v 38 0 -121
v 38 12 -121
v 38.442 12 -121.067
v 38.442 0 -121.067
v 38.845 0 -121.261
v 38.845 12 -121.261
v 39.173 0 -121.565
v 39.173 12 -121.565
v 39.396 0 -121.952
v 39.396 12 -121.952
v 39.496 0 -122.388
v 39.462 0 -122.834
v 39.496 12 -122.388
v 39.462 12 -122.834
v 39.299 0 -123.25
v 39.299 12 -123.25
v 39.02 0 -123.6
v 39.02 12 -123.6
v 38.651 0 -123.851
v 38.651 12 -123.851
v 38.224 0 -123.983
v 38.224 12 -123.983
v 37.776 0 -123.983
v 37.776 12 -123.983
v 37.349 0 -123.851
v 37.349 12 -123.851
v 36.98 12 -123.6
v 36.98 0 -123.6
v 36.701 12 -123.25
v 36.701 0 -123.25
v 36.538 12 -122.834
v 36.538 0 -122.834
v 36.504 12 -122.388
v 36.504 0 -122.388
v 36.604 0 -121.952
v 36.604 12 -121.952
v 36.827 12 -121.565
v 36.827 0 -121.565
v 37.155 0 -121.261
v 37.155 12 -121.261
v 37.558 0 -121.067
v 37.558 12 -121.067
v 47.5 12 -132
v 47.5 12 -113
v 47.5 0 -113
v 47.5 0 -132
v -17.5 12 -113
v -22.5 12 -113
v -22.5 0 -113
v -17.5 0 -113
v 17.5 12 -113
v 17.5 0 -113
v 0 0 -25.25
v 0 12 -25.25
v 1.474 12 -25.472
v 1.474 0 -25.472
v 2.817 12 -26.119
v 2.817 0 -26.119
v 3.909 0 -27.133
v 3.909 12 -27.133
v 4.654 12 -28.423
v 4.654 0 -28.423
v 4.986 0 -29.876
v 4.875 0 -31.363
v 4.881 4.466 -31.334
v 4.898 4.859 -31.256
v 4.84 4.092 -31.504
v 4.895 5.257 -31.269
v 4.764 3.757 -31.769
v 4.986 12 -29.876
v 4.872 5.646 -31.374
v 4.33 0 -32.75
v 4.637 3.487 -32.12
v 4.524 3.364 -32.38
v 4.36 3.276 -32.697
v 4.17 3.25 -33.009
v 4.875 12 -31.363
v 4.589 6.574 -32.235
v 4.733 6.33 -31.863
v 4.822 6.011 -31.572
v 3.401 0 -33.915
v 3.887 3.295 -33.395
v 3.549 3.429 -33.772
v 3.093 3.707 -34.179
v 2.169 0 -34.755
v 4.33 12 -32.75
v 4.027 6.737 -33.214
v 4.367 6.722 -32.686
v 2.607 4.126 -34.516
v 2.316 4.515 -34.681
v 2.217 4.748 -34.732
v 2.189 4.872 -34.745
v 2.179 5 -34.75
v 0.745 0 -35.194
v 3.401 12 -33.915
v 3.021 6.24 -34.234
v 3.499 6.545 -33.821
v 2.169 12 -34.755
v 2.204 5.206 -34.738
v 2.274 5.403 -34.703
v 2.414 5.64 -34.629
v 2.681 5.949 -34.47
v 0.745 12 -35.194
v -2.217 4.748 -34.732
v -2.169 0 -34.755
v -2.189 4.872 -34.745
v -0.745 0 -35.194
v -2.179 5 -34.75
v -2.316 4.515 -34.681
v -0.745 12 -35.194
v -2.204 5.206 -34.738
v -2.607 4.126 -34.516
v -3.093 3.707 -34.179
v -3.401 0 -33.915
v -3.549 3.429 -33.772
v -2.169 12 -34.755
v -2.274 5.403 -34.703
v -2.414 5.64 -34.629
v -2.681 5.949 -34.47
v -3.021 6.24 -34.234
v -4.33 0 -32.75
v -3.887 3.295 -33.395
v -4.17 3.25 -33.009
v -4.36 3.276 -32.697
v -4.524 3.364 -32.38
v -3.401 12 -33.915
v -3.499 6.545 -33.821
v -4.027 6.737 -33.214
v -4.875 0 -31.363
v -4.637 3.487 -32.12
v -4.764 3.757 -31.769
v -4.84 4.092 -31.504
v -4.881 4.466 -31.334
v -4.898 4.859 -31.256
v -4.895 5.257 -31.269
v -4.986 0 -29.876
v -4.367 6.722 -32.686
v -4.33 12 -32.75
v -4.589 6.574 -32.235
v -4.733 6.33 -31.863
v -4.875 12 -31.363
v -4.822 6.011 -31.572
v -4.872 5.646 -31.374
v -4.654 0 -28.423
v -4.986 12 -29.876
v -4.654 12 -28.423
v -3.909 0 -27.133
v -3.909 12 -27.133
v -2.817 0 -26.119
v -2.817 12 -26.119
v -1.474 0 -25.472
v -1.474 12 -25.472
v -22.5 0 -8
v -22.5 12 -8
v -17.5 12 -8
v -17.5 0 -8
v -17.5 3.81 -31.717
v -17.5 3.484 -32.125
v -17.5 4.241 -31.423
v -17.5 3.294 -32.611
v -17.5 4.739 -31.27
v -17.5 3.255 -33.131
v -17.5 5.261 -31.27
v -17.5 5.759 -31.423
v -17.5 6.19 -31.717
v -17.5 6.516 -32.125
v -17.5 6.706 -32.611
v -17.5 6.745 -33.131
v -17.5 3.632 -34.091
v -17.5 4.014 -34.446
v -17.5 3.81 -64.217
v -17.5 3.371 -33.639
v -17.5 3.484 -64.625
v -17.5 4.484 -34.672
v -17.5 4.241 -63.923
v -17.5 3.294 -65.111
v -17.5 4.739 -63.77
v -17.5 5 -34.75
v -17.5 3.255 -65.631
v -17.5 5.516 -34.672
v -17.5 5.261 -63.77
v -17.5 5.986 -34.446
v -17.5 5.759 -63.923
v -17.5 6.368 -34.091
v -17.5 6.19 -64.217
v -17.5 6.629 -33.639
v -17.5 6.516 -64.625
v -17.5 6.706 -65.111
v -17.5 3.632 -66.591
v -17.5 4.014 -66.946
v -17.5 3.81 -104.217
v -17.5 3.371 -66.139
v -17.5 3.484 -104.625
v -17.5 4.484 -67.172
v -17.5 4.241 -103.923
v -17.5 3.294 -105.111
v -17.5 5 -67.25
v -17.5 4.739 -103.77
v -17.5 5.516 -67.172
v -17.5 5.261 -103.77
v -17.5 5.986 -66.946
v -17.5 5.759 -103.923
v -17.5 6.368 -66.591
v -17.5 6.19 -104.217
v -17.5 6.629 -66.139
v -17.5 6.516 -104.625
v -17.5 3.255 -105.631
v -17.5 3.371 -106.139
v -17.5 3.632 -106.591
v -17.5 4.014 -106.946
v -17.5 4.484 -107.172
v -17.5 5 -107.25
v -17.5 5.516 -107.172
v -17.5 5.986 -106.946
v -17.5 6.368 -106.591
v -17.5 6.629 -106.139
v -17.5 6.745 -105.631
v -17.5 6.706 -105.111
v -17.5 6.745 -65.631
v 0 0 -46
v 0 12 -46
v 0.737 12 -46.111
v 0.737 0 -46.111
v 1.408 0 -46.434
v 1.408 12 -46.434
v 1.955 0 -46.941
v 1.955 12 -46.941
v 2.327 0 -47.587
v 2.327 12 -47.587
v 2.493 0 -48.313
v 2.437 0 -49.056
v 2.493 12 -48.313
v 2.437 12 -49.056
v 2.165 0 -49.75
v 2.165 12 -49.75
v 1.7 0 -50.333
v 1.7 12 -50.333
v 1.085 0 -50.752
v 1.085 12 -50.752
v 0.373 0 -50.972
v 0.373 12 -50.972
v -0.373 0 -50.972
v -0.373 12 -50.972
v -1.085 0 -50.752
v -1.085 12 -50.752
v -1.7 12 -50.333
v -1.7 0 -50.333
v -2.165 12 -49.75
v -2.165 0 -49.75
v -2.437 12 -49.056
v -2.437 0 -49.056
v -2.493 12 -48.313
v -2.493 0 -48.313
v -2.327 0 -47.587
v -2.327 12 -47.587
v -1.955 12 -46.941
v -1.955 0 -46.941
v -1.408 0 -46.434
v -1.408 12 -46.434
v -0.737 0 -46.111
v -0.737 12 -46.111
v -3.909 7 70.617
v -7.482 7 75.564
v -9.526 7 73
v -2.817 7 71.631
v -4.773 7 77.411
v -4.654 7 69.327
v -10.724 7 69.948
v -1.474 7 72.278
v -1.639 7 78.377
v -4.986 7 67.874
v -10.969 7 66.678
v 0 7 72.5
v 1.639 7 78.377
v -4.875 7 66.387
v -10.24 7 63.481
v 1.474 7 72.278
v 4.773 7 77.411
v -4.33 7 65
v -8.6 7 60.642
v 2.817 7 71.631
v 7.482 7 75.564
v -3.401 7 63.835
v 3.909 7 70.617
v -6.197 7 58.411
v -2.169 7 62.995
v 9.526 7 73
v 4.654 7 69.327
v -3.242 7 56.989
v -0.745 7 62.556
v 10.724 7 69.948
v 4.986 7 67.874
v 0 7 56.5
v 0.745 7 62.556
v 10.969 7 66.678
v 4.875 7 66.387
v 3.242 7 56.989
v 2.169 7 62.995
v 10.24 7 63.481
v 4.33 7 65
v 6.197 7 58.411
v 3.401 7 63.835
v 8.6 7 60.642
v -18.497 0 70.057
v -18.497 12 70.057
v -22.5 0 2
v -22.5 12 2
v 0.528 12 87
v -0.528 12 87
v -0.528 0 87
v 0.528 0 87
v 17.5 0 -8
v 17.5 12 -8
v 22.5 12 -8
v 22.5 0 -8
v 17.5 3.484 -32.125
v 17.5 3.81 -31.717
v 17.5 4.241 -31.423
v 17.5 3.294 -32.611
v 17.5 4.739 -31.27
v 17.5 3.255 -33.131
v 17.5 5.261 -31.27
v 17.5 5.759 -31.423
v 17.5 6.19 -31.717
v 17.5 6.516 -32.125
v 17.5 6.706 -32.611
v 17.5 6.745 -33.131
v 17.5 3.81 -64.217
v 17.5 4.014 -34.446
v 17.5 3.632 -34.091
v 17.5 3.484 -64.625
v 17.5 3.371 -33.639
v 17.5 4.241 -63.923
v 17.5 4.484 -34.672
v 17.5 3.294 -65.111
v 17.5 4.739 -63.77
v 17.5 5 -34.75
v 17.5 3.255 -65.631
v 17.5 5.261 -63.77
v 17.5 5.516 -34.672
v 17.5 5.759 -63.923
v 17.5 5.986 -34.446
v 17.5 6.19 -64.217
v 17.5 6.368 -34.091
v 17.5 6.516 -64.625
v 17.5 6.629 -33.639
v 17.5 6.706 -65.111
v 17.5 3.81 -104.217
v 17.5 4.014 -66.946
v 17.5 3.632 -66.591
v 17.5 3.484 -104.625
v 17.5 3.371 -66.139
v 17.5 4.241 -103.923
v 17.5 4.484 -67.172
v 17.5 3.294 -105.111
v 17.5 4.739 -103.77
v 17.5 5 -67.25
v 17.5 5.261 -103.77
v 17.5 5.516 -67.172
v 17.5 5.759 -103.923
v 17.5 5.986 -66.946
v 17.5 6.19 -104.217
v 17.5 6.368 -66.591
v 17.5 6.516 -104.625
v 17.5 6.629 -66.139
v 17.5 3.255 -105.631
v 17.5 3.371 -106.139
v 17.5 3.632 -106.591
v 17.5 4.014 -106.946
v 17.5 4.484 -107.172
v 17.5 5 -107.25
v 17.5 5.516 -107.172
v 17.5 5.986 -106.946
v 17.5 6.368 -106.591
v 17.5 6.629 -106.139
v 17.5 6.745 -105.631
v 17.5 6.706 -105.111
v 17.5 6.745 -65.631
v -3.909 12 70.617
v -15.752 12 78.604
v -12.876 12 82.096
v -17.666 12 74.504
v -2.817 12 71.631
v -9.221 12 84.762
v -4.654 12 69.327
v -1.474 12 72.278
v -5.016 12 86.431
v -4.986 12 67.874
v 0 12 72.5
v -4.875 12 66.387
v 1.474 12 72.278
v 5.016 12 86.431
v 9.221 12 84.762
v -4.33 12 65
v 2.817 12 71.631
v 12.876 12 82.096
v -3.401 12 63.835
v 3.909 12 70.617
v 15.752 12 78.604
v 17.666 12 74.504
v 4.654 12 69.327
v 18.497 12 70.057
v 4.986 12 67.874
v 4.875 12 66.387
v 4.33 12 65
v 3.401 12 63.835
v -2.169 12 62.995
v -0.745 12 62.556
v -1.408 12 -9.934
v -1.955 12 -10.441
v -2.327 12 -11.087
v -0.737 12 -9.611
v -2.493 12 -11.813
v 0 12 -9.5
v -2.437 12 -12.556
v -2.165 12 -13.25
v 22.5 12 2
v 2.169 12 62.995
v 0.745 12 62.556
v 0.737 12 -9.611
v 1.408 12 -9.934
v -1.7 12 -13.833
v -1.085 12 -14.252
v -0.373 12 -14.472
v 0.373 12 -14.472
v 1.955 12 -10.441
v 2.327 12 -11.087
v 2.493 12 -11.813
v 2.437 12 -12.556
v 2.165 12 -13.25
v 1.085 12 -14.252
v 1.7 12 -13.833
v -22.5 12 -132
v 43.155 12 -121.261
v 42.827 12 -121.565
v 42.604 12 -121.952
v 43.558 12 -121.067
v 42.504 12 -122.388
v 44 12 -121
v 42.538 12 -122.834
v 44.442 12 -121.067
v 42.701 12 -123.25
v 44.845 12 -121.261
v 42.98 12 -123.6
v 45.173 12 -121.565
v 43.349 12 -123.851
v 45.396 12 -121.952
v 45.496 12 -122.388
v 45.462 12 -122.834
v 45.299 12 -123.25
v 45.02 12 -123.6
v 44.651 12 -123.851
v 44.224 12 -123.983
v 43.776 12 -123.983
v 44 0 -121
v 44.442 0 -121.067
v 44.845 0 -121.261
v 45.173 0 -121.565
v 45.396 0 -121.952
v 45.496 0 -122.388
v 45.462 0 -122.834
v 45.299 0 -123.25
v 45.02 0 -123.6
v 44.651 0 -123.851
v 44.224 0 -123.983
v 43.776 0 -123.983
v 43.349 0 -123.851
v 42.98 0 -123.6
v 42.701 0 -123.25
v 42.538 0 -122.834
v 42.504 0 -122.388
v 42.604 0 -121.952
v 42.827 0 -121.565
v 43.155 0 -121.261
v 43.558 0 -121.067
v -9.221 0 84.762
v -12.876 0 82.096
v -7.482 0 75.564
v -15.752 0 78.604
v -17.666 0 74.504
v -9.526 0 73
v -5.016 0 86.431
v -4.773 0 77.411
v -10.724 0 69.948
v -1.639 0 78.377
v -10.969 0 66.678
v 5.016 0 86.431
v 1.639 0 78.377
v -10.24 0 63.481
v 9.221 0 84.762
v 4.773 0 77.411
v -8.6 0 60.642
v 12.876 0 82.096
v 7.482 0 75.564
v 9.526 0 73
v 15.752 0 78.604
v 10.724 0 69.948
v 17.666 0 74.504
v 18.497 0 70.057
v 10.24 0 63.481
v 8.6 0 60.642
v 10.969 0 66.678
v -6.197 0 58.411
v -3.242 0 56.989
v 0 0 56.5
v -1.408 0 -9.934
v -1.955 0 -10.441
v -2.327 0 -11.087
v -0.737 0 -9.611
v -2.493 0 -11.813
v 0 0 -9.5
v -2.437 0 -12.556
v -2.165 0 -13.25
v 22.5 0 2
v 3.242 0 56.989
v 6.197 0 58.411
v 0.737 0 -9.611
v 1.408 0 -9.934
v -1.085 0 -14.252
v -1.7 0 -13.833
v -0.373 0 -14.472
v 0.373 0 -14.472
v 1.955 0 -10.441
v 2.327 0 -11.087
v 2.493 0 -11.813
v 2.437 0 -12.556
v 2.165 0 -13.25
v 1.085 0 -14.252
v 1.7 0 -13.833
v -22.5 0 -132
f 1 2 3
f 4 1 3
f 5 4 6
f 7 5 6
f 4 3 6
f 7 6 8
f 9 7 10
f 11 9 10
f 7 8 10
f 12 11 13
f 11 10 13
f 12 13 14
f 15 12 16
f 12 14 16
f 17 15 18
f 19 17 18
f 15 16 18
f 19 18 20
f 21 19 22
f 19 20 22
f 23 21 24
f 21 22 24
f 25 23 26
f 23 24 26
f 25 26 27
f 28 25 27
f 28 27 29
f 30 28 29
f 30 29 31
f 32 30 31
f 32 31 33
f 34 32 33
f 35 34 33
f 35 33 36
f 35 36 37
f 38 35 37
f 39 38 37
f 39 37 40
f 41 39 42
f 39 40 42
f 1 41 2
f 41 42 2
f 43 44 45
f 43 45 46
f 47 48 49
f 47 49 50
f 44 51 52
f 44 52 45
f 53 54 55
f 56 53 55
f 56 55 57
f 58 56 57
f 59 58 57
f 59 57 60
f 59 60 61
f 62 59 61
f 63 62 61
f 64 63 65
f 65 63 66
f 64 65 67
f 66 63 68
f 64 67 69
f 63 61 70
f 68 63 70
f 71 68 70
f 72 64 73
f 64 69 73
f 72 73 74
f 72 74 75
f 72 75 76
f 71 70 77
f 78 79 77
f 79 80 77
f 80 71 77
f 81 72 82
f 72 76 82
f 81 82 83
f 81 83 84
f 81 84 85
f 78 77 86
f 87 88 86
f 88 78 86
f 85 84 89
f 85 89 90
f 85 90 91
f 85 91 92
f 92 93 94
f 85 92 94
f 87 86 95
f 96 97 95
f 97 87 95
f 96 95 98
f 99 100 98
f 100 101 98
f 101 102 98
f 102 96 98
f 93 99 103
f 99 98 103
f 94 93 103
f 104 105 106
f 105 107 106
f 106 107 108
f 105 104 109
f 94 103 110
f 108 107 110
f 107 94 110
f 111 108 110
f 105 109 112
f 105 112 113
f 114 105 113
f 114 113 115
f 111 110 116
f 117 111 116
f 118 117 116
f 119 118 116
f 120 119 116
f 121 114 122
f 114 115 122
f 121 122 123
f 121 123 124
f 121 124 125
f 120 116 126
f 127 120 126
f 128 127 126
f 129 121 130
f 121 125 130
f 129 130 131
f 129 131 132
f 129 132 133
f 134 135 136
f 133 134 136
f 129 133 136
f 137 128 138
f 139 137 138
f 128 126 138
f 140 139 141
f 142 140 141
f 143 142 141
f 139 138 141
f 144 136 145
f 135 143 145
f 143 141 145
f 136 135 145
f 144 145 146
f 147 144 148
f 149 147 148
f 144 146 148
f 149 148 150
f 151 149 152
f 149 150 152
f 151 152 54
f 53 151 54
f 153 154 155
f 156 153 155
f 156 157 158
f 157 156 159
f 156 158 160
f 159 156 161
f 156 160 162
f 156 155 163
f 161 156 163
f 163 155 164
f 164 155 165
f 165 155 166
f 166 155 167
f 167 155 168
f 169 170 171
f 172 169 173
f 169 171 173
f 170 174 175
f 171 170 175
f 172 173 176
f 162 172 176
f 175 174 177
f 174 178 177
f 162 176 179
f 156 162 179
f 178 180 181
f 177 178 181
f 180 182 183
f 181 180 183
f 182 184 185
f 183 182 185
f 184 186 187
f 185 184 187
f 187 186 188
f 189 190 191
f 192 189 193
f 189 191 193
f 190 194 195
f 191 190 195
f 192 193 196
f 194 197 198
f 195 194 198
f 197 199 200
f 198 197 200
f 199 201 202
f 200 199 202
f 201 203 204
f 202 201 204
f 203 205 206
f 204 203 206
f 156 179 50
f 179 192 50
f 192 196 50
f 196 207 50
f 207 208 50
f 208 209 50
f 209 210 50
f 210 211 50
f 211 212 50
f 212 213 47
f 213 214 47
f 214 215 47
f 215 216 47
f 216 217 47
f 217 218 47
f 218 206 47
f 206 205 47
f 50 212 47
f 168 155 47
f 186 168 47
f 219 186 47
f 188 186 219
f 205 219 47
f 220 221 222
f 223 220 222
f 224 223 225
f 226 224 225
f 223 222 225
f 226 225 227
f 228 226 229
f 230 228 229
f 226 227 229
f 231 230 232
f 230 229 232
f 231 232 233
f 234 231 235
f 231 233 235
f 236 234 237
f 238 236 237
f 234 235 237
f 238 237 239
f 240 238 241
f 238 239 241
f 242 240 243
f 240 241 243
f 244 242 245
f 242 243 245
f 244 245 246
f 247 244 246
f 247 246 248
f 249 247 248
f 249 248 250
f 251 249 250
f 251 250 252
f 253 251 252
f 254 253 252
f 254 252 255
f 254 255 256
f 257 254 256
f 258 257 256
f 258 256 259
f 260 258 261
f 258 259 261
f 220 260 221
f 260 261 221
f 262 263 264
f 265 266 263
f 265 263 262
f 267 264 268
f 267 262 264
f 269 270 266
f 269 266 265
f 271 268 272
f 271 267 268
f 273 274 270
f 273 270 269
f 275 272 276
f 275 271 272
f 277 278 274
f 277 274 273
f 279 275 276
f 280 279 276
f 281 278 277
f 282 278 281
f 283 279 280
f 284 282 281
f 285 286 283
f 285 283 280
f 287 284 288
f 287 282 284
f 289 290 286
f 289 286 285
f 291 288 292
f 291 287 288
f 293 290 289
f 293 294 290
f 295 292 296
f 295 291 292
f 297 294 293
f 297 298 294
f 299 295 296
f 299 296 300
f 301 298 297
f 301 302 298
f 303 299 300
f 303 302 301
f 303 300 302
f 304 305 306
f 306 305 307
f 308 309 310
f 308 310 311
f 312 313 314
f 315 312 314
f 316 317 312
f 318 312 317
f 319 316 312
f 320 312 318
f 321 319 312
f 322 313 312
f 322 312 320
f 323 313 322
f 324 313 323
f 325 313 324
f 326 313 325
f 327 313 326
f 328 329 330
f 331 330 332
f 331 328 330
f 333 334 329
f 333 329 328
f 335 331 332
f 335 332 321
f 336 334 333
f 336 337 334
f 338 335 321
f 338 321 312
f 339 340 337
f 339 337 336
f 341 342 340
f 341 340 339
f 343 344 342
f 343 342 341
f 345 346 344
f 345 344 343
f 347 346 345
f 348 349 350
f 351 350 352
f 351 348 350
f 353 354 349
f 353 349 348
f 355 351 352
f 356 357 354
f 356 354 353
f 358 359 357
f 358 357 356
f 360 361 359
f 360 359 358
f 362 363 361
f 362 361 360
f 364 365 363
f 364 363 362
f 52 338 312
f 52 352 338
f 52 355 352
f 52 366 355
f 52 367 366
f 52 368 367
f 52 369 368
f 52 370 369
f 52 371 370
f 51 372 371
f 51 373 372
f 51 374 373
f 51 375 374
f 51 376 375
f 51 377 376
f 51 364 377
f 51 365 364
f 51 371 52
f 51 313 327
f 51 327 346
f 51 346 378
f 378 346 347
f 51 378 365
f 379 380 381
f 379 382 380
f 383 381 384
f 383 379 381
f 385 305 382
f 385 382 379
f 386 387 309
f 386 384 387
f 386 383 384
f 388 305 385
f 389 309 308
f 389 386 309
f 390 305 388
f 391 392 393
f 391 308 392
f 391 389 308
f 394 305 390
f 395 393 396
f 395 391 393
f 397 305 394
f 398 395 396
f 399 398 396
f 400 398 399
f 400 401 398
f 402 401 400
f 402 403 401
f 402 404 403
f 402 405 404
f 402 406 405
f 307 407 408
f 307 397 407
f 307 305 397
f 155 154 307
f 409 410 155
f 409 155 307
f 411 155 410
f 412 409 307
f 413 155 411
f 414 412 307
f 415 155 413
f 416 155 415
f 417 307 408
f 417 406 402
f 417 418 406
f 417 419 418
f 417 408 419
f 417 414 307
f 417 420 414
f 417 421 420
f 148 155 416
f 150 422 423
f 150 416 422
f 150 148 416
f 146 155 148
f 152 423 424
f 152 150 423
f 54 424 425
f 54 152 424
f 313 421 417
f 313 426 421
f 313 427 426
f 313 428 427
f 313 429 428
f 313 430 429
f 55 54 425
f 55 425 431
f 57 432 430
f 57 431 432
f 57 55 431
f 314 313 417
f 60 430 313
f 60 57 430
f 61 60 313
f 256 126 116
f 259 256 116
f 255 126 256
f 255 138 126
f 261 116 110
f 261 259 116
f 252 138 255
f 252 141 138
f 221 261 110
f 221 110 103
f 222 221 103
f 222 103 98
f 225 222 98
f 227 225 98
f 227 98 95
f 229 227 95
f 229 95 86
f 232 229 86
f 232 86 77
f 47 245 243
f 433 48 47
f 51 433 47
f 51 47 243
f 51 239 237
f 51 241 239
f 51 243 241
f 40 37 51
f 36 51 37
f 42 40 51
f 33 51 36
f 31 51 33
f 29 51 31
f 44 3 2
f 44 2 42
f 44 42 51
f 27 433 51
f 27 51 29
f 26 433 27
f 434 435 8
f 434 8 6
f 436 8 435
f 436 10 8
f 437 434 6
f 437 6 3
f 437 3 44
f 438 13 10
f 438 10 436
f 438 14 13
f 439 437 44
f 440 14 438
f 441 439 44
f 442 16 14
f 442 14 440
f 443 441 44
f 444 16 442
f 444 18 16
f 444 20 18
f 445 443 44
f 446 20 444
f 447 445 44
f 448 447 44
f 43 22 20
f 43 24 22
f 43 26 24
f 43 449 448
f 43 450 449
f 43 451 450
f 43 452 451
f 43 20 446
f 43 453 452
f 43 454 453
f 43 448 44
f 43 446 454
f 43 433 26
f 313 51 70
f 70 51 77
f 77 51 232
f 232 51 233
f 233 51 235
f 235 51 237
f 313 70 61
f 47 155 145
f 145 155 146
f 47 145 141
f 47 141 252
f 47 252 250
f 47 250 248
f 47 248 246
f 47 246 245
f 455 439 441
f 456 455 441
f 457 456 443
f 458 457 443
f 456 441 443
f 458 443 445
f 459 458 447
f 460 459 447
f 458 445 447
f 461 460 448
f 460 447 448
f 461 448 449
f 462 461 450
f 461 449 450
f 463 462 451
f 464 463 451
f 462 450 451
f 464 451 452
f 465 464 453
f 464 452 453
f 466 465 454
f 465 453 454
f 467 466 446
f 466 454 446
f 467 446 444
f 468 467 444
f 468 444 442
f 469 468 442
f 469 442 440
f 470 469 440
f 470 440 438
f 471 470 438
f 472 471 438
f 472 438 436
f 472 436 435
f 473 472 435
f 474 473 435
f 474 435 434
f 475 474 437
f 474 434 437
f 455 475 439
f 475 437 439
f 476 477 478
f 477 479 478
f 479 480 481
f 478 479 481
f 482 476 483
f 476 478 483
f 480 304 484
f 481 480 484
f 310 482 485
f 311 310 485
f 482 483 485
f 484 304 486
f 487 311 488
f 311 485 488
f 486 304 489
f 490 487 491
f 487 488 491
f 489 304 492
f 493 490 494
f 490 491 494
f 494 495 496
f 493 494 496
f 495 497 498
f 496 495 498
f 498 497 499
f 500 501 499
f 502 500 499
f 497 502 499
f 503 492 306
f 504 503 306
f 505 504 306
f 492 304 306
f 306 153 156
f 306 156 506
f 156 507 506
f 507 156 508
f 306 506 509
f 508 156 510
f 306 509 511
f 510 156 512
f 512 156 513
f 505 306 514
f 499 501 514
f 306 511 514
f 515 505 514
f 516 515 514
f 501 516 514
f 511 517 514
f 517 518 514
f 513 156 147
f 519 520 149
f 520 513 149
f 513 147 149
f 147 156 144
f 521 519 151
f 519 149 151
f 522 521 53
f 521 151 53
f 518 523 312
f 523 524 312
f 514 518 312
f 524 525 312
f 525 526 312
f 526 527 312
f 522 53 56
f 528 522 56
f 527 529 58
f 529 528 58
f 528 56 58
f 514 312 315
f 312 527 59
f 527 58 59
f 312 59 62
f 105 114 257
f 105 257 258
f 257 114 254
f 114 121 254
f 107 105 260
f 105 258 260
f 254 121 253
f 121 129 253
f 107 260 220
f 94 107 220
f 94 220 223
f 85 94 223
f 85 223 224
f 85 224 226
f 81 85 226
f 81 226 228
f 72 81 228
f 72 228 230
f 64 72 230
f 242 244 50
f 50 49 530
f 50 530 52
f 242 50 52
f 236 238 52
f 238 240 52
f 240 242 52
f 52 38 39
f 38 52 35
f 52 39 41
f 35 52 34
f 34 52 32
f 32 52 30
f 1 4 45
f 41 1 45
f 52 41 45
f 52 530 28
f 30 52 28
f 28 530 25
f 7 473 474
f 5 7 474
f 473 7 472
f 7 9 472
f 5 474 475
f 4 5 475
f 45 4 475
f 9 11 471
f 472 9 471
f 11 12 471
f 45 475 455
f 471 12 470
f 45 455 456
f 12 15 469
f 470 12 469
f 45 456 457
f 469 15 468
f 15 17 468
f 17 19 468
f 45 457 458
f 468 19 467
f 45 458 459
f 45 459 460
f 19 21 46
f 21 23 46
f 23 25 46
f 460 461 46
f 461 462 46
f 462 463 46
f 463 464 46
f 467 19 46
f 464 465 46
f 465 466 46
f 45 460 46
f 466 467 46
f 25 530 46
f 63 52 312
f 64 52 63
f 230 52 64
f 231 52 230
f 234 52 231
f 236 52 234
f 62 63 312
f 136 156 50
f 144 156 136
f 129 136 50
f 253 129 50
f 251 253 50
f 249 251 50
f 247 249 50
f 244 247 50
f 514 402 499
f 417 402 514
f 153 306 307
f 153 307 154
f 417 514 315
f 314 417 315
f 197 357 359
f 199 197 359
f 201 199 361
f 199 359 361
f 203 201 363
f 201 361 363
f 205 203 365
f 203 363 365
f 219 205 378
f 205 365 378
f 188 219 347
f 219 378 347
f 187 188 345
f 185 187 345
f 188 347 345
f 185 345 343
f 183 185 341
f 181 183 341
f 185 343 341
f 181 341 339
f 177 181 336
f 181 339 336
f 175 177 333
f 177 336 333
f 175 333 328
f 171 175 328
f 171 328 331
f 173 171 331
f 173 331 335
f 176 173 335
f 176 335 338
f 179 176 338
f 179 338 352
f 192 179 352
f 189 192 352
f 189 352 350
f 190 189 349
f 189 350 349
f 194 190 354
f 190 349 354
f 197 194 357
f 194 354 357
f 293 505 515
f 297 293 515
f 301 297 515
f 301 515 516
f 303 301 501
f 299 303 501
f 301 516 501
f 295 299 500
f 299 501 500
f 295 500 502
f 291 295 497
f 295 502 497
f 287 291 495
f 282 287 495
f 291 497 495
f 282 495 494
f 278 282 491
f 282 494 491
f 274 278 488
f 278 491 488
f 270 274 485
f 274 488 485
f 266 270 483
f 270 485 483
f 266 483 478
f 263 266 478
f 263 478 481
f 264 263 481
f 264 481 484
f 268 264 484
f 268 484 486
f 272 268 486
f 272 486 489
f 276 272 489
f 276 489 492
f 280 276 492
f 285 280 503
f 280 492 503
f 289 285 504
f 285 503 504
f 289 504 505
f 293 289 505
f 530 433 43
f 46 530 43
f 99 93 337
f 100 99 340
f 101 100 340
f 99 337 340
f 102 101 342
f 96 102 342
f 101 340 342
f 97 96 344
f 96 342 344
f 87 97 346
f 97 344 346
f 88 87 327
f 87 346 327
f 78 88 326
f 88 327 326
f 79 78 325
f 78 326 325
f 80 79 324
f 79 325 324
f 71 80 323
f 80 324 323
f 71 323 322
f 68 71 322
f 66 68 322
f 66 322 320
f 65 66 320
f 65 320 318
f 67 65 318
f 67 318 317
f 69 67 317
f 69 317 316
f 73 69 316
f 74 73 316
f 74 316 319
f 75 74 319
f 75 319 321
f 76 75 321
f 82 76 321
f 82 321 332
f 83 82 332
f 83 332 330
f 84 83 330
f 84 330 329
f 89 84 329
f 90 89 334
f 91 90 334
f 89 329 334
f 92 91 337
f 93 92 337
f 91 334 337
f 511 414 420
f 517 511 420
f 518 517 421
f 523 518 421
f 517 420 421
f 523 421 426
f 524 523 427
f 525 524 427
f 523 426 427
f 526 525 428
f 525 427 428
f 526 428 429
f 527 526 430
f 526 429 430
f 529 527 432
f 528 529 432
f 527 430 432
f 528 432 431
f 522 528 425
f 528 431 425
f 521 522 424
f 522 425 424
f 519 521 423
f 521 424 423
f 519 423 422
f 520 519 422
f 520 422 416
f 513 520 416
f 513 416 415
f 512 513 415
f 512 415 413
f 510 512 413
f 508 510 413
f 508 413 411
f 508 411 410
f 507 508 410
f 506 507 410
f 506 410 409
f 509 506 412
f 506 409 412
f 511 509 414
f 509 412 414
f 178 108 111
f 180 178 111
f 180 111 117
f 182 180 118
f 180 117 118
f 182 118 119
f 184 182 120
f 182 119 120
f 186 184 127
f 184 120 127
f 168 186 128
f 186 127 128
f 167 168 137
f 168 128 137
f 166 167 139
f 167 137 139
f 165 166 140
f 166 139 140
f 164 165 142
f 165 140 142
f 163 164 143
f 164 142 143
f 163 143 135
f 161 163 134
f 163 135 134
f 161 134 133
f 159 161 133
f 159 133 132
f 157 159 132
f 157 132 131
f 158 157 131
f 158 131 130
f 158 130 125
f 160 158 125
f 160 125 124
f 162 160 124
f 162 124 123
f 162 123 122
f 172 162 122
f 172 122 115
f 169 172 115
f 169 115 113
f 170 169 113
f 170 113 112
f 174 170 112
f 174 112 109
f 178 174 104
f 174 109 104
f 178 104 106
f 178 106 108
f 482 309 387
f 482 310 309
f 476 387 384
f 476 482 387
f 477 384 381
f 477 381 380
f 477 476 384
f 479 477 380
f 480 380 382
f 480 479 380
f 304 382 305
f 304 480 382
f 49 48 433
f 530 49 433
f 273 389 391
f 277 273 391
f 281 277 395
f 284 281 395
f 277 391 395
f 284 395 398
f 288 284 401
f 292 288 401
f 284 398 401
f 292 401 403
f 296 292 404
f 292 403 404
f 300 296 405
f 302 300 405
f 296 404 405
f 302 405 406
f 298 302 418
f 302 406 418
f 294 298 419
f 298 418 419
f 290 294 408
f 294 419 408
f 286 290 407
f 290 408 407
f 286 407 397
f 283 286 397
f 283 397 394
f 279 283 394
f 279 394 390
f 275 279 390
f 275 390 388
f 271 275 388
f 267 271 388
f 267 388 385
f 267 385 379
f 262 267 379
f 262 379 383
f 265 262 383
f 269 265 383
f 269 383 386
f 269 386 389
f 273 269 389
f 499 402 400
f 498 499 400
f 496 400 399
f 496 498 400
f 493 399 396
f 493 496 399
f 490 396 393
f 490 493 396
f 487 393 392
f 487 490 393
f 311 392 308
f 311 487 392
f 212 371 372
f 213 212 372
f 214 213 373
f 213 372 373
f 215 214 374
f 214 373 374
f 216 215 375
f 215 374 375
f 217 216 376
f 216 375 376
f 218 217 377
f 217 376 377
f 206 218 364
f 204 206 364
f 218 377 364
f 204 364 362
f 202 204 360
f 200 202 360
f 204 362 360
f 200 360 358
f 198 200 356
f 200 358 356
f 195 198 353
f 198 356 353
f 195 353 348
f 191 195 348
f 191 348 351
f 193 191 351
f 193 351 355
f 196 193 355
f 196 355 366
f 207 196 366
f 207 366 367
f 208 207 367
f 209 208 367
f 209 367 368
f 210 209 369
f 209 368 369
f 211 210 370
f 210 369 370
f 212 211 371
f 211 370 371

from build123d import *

# Parameters (mm, degrees)
SKETCH1_W           = 45
SKETCH1_H           = 250
BOSS_EXTRUDE1_DEPTH = 12
SKETCH2_R           = 2.5
SKETCH2_R_2         = 5
SKETCH2_W           = 5
SKETCH2_H           = 105
SKETCH2_W_2         = 45
SKETCH2_H_2         = 15
CUT_EXTRUDE1_DEPTH  = 12
SKETCH3_R           = 1.75
CUT_EXTRUDE2_DEPTH  = 35
SKETCH4_W           = 25
SKETCH4_H           = 12
BOSS_EXTRUDE2_DEPTH = 12
SKETCH5_W           = 45
SKETCH5_H           = 23
CUT_EXTRUDE3_DEPTH  = 20
SKETCH6_W           = 70
SKETCH6_H           = 7
BOSS_EXTRUDE3_DEPTH = 12
SKETCH7_R           = 1.5
CUT_EXTRUDE4_DEPTH  = 12
CUT_EXTRUDE5_DEPTH  = 20
FILLET1_R           = 18
SKETCH9_R           = 11
CUT_EXTRUDE6_DEPTH  = 7


with BuildPart() as part:
    # Sketch1 → Boss-Extrude1 (new body)
    with BuildSketch(Plane(origin=(0, 0, 0), x_dir=(1, 0, 0), z_dir=(0, 1, 0))):
        Rectangle(SKETCH1_W, SKETCH1_H)
    extrude(amount=BOSS_EXTRUDE1_DEPTH)

    # Sketch2 → Cut-Extrude1 (cut)
    with BuildSketch(Plane(origin=(0, 12, 0), x_dir=(1, 0, 0), z_dir=(0, 1, 0))):
        with Locations(Location((0, 12, 0), (0, 0, 270))):
            Circle(SKETCH2_R)
        with Locations(Location((0, 30.25, 0), (0, 0, 270))):
            Circle(SKETCH2_R_2)
        with Locations(Location((0, 48.5, 0), (0, 0, 270))):
            Circle(SKETCH2_R)
        with Locations(Location((0, -67.5, 0), (0, 0, 270))):
            Circle(SKETCH2_R_2)
        with Locations((20, 60.5)):
            Rectangle(SKETCH2_W, SKETCH2_H)
        with Locations((-20, 60.5)):
            Rectangle(SKETCH2_W, SKETCH2_H)
        with Locations((0, -117.5)):
            Rectangle(SKETCH2_W_2, SKETCH2_H_2)
    extrude(amount=-CUT_EXTRUDE1_DEPTH, mode=Mode.SUBTRACT)

    # Sketch3 → Cut-Extrude2 (cut)
    with BuildSketch(Plane(origin=(17.5, 0, 0), x_dir=(0, 0, -1), z_dir=(1, 0, 0))):
        with Locations((33, 5)):
            Circle(SKETCH3_R)
        with Locations((65.5, 5)):
            Circle(SKETCH3_R)
        with Locations((105.5, 5)):
            Circle(SKETCH3_R)
    extrude(amount=-CUT_EXTRUDE2_DEPTH, mode=Mode.SUBTRACT)

    # Sketch4 → Boss-Extrude2 (add)
    with BuildSketch(Plane(origin=(0, 12, 0), x_dir=(1, 0, 0), z_dir=(0, 1, 0))):
        with Locations((35, 119)):
            Rectangle(SKETCH4_W, SKETCH4_H)
    extrude(amount=-BOSS_EXTRUDE2_DEPTH)

    # Sketch5 → Cut-Extrude3 (cut)
    with BuildSketch(Plane(origin=(0, 12, 0), x_dir=(1, 0, 0), z_dir=(0, 1, 0))):
        with Locations((0, -98.5)):
            Rectangle(SKETCH5_W, SKETCH5_H)
    extrude(amount=-CUT_EXTRUDE3_DEPTH, mode=Mode.SUBTRACT)

    # Sketch6 → Boss-Extrude3 (add)
    with BuildSketch(Plane(origin=(0, 12, 0), x_dir=(1, 0, 0), z_dir=(0, 1, 0))):
        with Locations((12.5, 128.5)):
            Rectangle(SKETCH6_W, SKETCH6_H)
    extrude(amount=-BOSS_EXTRUDE3_DEPTH)

    # Sketch7 → Cut-Extrude4 (cut)
    with BuildSketch(Plane(origin=(0, 12, 0), x_dir=(1, 0, 0), z_dir=(0, 1, 0))):
        with Locations(Location((38, 122.5, 0), (0, 0, 270))):
            Circle(SKETCH7_R)
        with Locations(Location((44, 122.5, 0), (0, 0, 270))):
            Circle(SKETCH7_R)
    extrude(amount=-CUT_EXTRUDE4_DEPTH, mode=Mode.SUBTRACT)

    # Sketch8 → Cut-Extrude5 (cut)
    with BuildSketch(Plane(origin=(0, 12, 0), x_dir=(1, 0, 0), z_dir=(0, 1, 0))):
        Polygon((-22.5, -2), (-22.5, -87), (-17.5, -87), align=None)
        Polygon((17.5, -87), (22.5, -2), (22.5, -87), align=None)
    extrude(amount=-CUT_EXTRUDE5_DEPTH, mode=Mode.SUBTRACT)

    # Fillet1
    fillet1_edges = [part.edges().sort_by_distance(p)[0] for p in [
        (17.5, 6, 87),
        (-17.5, 6, 87),
    ]]
    fillet(fillet1_edges, radius=FILLET1_R)

    # Sketch9 → Cut-Extrude6 (cut)
    with BuildSketch(Plane.XZ):
        with Locations(Location((0, 67.5, 0), (0, 0, 270))):
            Circle(SKETCH9_R)
    extrude(amount=-CUT_EXTRUDE6_DEPTH, mode=Mode.SUBTRACT)


solid = part.part
